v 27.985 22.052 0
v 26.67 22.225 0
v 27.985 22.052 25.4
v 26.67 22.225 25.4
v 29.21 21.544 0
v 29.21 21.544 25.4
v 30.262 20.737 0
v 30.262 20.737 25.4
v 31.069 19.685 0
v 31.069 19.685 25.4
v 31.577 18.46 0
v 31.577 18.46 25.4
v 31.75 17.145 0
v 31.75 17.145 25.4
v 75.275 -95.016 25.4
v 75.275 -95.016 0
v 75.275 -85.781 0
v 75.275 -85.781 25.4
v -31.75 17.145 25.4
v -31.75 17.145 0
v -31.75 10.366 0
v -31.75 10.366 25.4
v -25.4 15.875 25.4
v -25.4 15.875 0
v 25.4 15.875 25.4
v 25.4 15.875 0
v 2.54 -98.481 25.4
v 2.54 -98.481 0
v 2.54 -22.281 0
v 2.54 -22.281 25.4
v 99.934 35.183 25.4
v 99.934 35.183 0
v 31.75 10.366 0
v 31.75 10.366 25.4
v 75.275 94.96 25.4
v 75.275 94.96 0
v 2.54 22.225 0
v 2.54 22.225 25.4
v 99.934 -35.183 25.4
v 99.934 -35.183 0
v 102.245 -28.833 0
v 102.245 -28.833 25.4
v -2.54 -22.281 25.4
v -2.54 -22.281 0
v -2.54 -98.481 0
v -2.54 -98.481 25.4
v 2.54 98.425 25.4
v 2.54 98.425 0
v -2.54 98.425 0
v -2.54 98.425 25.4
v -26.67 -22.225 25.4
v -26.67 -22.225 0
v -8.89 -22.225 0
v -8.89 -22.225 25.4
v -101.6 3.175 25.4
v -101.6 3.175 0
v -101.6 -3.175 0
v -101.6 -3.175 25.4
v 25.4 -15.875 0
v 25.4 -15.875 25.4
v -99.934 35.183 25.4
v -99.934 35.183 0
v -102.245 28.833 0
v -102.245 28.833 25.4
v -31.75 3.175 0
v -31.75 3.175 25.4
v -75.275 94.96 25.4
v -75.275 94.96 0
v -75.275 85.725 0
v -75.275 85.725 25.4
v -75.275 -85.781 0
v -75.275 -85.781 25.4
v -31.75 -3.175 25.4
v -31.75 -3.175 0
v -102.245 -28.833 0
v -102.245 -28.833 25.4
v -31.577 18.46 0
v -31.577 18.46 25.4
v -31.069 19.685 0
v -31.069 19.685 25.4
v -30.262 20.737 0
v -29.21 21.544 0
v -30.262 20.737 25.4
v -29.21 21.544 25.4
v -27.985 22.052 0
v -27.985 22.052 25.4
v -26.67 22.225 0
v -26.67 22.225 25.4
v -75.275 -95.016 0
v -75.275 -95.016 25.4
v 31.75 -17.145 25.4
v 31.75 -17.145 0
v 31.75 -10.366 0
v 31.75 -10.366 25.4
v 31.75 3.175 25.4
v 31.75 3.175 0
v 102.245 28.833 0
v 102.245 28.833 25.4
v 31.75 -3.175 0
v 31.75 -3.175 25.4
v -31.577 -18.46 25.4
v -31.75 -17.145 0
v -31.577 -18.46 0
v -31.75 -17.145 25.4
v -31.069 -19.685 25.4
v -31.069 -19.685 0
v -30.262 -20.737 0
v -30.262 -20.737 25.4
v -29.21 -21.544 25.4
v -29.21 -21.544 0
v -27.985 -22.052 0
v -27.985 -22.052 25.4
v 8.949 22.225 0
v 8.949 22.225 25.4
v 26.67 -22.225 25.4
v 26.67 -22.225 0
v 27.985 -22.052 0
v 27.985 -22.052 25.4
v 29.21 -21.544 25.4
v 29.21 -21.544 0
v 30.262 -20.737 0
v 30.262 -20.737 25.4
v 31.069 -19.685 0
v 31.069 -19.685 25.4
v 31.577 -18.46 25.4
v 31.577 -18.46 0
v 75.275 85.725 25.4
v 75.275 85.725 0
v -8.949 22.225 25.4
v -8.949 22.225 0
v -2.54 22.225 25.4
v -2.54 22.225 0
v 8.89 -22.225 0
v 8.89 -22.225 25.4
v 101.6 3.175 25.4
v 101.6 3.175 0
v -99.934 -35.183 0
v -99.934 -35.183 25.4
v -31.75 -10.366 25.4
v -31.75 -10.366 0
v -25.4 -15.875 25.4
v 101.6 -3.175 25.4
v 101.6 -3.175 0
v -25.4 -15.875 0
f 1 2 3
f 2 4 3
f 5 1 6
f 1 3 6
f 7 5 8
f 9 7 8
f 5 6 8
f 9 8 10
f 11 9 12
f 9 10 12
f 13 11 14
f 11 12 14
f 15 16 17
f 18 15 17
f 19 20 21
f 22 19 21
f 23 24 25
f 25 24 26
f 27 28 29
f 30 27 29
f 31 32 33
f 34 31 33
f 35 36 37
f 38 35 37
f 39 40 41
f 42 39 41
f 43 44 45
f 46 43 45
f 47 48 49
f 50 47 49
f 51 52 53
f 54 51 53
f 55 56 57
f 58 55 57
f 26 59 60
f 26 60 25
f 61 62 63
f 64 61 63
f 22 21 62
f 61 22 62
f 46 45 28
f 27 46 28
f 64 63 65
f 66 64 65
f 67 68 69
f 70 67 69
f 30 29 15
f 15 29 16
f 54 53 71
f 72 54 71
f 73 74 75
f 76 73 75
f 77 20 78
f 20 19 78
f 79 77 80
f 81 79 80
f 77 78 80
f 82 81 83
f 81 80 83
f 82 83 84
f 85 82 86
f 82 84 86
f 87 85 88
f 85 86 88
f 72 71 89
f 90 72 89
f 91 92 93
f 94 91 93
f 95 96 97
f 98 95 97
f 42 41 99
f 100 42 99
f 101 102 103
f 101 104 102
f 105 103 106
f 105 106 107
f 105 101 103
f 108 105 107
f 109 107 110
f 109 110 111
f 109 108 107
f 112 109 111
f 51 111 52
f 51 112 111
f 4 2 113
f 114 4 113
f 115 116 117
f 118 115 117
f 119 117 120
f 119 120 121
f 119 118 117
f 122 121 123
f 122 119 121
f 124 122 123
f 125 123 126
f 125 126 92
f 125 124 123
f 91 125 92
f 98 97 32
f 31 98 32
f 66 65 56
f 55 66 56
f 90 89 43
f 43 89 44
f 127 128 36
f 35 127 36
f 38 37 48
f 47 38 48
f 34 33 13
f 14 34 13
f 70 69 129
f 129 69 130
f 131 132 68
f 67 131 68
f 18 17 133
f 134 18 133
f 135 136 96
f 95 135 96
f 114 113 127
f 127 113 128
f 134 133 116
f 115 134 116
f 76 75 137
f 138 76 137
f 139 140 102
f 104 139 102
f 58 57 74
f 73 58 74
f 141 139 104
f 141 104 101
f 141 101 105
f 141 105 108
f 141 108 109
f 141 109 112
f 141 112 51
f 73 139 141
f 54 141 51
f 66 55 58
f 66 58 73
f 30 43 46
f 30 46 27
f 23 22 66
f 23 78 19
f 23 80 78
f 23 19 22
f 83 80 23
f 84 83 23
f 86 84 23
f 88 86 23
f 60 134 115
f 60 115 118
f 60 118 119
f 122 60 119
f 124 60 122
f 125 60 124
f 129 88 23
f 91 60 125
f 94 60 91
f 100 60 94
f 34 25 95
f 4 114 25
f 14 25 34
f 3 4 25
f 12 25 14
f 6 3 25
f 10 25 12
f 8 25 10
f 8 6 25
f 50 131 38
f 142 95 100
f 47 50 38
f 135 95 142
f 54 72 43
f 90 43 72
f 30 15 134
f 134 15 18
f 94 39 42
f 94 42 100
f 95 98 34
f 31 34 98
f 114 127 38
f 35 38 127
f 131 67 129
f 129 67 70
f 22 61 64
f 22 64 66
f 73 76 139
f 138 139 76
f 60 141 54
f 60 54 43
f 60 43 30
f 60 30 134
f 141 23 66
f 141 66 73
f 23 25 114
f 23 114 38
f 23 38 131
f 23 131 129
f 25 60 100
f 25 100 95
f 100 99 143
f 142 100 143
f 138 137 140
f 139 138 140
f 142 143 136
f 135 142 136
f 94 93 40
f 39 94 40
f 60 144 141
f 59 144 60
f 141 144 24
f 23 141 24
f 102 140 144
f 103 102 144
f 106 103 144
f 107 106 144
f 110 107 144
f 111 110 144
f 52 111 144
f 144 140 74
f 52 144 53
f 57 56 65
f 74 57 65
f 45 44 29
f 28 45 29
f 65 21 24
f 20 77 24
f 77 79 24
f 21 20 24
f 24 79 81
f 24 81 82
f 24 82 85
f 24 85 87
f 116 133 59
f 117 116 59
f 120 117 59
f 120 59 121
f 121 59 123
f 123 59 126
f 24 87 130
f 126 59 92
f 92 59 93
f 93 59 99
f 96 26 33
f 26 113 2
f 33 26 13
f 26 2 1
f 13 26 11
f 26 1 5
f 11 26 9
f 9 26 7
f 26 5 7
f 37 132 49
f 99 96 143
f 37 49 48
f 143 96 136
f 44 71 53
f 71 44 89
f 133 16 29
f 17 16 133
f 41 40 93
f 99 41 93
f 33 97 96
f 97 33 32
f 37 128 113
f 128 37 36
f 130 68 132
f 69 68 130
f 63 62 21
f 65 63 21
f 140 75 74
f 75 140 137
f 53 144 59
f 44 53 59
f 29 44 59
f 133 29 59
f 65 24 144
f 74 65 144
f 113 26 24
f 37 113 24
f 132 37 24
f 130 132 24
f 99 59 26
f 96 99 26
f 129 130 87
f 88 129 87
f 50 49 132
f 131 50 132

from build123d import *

# Parameters (mm, degrees)
SKETCH1_W           = 50.8
SKETCH1_H           = 31.75
BOSS_EXTRUDE1_DEPTH = 25.4
FILLET1_R           = 5.08


with BuildPart() as part:
    # Sketch1 → Boss-Extrude1 (new body)
    with BuildSketch(Plane.XY):
        Polygon((-101.6, -3.175), (-31.75, -3.175), (-102.245124878, -28.833127117), (-99.933913891, -35.183127117), (-31.75, -10.366212005), (-31.75, -22.225), (-8.889749428, -22.225), (-75.27486339, -85.781410988), (-75.27486339, -95.016274378), (-2.54, -22.281410988), (-2.54, -98.481410988), (2.54, -98.481410988), (2.54, -22.281410988), (75.27486339, -95.016274378), (75.27486339, -85.781410988), (8.889749428, -22.225), (31.75, -22.225), (31.75, -10.366212005), (99.933913891, -35.183127117), (102.245124878, -28.833127117), (31.75, -3.175), (101.6, -3.175), (101.6, 3.175), (31.75, 3.175), (102.245124878, 28.833127117), (99.933913891, 35.183127117), (31.75, 10.366212005), (31.75, 22.225), (8.948671098, 22.225), (75.27486339, 85.725), (75.27486339, 94.95986339), (2.54, 22.225), (2.54, 98.425), (-2.54, 98.425), (-2.54, 22.225), (-75.27486339, 94.95986339), (-75.27486339, 85.725), (-8.948671098, 22.225), (-31.75, 22.225), (-31.75, 10.366212005), (-99.933913891, 35.183127117), (-102.245124878, 28.833127117), (-31.75, 3.175), (-101.6, 3.175), align=None)
        Rectangle(SKETCH1_W, SKETCH1_H, mode=Mode.SUBTRACT)
    extrude(amount=BOSS_EXTRUDE1_DEPTH)

    # Fillet1
    fillet1_edges = [part.edges().sort_by_distance(p)[0] for p in [
        (31.75, -22.225, 12.7),
        (-31.75, -22.225, 12.7),
        (-31.75, 22.225, 12.7),
        (31.75, 22.225, 12.7),
    ]]
    fillet(fillet1_edges, radius=FILLET1_R)


solid = part.part
